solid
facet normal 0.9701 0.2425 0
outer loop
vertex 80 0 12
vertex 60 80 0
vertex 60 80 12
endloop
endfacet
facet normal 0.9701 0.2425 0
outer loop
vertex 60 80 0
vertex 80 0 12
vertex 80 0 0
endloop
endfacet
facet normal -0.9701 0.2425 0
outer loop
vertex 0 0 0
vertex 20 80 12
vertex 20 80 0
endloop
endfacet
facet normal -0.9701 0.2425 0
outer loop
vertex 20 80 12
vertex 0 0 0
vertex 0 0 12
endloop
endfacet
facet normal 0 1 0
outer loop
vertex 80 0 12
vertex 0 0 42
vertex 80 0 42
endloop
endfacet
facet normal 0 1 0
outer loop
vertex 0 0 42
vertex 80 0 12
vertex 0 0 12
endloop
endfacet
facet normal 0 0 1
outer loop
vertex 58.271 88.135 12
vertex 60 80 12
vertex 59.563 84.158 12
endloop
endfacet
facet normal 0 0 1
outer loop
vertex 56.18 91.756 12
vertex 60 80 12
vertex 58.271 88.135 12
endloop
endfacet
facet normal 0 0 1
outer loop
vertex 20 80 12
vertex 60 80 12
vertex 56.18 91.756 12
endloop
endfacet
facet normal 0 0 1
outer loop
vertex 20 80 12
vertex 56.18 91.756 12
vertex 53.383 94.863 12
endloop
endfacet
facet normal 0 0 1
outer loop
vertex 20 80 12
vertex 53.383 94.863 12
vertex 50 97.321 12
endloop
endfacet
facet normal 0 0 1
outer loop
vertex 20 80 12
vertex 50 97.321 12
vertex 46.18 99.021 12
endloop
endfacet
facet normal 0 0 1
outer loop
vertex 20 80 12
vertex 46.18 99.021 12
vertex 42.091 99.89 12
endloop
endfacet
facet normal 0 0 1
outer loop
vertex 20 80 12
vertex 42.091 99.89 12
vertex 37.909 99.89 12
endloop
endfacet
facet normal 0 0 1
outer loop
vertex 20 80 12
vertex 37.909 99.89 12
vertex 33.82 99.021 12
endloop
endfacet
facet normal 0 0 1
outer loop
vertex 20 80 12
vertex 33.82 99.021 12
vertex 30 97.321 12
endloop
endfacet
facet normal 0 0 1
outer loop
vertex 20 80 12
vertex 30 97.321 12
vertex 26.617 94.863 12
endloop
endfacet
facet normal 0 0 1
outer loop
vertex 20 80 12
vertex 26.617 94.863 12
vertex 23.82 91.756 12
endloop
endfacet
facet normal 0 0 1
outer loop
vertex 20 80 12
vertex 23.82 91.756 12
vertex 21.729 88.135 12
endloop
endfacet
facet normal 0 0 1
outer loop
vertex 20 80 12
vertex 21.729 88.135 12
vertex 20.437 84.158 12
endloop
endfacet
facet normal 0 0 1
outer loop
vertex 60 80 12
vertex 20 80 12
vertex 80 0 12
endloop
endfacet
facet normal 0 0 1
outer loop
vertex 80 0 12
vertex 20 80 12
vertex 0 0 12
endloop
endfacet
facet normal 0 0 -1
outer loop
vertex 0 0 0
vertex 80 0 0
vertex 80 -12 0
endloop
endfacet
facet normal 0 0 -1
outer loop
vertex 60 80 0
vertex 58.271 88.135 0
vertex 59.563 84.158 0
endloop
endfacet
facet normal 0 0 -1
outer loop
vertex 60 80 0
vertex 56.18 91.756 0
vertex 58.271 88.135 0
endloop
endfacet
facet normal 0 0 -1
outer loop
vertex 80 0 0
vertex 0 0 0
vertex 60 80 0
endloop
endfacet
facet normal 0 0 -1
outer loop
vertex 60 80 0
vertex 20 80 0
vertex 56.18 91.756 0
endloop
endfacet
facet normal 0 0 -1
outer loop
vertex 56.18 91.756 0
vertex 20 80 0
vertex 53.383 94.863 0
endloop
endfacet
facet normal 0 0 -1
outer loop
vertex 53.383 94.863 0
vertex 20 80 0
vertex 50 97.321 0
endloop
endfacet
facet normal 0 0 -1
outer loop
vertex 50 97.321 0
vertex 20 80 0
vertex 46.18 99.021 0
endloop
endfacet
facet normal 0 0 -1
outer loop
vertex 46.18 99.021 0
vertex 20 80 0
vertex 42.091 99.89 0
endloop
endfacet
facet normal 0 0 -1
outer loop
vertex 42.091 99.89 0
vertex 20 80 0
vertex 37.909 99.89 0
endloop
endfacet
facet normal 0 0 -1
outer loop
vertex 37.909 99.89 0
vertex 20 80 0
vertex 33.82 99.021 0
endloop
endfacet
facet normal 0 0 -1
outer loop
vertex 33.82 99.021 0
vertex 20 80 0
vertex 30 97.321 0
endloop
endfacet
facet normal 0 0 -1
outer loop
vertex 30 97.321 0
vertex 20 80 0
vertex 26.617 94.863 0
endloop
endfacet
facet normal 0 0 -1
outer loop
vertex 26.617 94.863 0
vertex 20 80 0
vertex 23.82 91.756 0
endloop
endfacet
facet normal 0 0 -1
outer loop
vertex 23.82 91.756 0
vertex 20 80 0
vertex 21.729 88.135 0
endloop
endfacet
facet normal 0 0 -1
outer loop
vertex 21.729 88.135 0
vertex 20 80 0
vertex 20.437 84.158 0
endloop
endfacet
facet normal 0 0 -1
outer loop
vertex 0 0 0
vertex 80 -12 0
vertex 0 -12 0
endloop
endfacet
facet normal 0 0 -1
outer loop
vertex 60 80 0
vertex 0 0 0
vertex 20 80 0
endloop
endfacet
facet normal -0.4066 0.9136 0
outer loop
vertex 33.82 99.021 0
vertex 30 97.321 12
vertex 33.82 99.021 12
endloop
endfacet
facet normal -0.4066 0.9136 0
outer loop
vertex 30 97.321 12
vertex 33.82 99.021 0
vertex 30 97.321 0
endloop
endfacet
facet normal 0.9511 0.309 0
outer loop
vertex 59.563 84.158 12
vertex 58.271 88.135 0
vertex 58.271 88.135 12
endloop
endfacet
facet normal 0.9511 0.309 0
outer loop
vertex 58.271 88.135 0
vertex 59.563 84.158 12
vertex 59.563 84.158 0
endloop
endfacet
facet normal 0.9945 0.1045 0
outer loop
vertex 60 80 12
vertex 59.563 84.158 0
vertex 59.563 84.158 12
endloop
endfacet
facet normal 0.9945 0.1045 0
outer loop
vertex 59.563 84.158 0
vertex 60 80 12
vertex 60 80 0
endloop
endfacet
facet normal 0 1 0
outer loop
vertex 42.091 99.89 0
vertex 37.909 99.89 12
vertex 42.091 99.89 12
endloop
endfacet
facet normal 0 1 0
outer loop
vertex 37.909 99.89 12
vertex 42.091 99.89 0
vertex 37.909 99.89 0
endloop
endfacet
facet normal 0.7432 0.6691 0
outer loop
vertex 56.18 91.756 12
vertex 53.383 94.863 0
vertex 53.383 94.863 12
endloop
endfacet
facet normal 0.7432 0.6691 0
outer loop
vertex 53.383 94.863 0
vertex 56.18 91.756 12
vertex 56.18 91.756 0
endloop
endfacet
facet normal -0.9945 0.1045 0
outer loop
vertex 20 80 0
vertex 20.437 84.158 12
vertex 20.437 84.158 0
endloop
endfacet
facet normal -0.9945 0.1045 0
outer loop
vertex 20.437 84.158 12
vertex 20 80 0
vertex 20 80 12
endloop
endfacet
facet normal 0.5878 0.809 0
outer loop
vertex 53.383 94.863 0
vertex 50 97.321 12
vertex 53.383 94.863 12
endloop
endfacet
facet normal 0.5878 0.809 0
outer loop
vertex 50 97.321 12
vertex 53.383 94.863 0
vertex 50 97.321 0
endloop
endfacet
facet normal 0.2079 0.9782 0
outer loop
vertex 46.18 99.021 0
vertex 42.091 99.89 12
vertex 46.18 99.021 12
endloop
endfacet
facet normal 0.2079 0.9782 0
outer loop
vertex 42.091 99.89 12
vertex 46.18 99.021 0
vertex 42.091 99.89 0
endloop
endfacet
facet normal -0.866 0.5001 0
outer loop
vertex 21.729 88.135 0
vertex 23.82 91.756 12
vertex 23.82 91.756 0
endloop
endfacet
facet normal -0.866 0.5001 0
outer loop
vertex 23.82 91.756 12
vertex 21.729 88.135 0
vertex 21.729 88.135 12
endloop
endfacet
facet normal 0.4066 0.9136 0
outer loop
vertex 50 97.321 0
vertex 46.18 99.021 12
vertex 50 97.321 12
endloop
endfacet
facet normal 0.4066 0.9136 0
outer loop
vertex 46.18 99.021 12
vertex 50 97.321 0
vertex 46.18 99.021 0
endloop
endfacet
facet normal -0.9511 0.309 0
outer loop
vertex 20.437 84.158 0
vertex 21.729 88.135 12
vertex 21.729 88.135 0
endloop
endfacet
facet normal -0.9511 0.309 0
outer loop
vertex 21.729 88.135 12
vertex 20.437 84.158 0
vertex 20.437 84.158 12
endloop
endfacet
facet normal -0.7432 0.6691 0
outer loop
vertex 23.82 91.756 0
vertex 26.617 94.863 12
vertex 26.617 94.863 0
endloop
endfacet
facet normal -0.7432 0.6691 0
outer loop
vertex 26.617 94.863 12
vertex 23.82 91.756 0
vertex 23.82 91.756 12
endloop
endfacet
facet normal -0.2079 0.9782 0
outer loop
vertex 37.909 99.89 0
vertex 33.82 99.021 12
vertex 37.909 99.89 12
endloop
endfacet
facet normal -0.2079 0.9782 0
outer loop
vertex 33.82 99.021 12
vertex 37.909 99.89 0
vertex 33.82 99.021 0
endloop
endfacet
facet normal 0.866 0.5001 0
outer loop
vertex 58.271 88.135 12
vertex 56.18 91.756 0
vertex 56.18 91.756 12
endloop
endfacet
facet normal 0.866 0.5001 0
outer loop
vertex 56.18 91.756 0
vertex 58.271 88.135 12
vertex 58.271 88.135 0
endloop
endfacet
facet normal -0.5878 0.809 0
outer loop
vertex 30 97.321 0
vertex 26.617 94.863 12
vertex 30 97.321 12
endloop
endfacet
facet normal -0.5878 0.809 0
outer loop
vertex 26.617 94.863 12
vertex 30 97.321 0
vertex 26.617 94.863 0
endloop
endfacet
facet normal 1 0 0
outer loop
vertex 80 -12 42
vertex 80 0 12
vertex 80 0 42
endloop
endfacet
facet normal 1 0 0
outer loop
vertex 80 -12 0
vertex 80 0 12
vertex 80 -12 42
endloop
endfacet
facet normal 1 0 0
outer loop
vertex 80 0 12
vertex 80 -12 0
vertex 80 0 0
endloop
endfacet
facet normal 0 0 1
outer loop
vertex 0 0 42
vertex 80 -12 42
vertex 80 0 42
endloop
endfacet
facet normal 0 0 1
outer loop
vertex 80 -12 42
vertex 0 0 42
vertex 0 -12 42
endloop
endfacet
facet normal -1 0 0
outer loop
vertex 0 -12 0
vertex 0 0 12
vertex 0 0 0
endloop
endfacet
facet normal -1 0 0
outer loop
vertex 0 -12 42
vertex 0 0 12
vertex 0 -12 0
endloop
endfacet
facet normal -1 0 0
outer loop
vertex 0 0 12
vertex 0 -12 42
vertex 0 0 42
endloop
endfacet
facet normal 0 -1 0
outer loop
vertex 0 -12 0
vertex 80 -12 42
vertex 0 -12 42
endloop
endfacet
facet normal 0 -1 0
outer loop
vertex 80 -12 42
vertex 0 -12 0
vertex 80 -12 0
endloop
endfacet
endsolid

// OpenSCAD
// file: support.scad
include <variables.scad>

// Support
module support() {
    linear_extrude(height = supportThickness)
    polygon(points = [[0, 0], [supportWidth, 0], [supportWidth - supportTaper, supportHoleHeight], [supportTaper, supportHoleHeight]]);

    translate([supportWidth / 2, supportHoleHeight, 0])
    linear_extrude(height = supportThickness)
    circle(r = (supportWidth - supportTaper * 2) / 2);

    translate([0, -1 * supportThickness, 0]) cube([supportWidth, supportThickness, supportThickness + supportBaseDepth]);
}

support();
// file: variables.scad
// Support
supportThickness = 12;
supportHoleHeight = 80;
supportWidth = 80;
supportTaper = 20;
supportBaseDepth = 30;

// Support right
supportRightHoleRadius = 6;

// Camera mount
cameraMountGoproWidth = 63;
cameraMountGoproHeight = 45;
cameraMountGoproDepth = 25;

cameraMountThickness = 5;
cameraMountWidth = cameraMountGoproWidth + 2 * cameraMountThickness;
cameraMountHeight = cameraMountGoproHeight + 2 * cameraMountThickness;
cameraMountDepth = cameraMountGoproDepth + cameraMountThickness;

cameraMountShutterCutoutWidth = 13;
cameraMountShutterCutoutOffsetX = 8;
cameraMountShutterCutoutOffsetZ = 6;
cameraMountShutterCutoutGap = 5;

cameraMountPowerCutoutDepth = 10;
cameraMountPowerCutoutHeight = 9;
cameraMountPowerCutoutOffsetY = 9;
cameraMountPowerCutoutOffsetZ = 7;
cameraMountPowerCutoutGap = 5;
// main file
include <variables.scad>
use <support.scad>

// Left support
module leftSupport() {
    support();
}

leftSupport();
